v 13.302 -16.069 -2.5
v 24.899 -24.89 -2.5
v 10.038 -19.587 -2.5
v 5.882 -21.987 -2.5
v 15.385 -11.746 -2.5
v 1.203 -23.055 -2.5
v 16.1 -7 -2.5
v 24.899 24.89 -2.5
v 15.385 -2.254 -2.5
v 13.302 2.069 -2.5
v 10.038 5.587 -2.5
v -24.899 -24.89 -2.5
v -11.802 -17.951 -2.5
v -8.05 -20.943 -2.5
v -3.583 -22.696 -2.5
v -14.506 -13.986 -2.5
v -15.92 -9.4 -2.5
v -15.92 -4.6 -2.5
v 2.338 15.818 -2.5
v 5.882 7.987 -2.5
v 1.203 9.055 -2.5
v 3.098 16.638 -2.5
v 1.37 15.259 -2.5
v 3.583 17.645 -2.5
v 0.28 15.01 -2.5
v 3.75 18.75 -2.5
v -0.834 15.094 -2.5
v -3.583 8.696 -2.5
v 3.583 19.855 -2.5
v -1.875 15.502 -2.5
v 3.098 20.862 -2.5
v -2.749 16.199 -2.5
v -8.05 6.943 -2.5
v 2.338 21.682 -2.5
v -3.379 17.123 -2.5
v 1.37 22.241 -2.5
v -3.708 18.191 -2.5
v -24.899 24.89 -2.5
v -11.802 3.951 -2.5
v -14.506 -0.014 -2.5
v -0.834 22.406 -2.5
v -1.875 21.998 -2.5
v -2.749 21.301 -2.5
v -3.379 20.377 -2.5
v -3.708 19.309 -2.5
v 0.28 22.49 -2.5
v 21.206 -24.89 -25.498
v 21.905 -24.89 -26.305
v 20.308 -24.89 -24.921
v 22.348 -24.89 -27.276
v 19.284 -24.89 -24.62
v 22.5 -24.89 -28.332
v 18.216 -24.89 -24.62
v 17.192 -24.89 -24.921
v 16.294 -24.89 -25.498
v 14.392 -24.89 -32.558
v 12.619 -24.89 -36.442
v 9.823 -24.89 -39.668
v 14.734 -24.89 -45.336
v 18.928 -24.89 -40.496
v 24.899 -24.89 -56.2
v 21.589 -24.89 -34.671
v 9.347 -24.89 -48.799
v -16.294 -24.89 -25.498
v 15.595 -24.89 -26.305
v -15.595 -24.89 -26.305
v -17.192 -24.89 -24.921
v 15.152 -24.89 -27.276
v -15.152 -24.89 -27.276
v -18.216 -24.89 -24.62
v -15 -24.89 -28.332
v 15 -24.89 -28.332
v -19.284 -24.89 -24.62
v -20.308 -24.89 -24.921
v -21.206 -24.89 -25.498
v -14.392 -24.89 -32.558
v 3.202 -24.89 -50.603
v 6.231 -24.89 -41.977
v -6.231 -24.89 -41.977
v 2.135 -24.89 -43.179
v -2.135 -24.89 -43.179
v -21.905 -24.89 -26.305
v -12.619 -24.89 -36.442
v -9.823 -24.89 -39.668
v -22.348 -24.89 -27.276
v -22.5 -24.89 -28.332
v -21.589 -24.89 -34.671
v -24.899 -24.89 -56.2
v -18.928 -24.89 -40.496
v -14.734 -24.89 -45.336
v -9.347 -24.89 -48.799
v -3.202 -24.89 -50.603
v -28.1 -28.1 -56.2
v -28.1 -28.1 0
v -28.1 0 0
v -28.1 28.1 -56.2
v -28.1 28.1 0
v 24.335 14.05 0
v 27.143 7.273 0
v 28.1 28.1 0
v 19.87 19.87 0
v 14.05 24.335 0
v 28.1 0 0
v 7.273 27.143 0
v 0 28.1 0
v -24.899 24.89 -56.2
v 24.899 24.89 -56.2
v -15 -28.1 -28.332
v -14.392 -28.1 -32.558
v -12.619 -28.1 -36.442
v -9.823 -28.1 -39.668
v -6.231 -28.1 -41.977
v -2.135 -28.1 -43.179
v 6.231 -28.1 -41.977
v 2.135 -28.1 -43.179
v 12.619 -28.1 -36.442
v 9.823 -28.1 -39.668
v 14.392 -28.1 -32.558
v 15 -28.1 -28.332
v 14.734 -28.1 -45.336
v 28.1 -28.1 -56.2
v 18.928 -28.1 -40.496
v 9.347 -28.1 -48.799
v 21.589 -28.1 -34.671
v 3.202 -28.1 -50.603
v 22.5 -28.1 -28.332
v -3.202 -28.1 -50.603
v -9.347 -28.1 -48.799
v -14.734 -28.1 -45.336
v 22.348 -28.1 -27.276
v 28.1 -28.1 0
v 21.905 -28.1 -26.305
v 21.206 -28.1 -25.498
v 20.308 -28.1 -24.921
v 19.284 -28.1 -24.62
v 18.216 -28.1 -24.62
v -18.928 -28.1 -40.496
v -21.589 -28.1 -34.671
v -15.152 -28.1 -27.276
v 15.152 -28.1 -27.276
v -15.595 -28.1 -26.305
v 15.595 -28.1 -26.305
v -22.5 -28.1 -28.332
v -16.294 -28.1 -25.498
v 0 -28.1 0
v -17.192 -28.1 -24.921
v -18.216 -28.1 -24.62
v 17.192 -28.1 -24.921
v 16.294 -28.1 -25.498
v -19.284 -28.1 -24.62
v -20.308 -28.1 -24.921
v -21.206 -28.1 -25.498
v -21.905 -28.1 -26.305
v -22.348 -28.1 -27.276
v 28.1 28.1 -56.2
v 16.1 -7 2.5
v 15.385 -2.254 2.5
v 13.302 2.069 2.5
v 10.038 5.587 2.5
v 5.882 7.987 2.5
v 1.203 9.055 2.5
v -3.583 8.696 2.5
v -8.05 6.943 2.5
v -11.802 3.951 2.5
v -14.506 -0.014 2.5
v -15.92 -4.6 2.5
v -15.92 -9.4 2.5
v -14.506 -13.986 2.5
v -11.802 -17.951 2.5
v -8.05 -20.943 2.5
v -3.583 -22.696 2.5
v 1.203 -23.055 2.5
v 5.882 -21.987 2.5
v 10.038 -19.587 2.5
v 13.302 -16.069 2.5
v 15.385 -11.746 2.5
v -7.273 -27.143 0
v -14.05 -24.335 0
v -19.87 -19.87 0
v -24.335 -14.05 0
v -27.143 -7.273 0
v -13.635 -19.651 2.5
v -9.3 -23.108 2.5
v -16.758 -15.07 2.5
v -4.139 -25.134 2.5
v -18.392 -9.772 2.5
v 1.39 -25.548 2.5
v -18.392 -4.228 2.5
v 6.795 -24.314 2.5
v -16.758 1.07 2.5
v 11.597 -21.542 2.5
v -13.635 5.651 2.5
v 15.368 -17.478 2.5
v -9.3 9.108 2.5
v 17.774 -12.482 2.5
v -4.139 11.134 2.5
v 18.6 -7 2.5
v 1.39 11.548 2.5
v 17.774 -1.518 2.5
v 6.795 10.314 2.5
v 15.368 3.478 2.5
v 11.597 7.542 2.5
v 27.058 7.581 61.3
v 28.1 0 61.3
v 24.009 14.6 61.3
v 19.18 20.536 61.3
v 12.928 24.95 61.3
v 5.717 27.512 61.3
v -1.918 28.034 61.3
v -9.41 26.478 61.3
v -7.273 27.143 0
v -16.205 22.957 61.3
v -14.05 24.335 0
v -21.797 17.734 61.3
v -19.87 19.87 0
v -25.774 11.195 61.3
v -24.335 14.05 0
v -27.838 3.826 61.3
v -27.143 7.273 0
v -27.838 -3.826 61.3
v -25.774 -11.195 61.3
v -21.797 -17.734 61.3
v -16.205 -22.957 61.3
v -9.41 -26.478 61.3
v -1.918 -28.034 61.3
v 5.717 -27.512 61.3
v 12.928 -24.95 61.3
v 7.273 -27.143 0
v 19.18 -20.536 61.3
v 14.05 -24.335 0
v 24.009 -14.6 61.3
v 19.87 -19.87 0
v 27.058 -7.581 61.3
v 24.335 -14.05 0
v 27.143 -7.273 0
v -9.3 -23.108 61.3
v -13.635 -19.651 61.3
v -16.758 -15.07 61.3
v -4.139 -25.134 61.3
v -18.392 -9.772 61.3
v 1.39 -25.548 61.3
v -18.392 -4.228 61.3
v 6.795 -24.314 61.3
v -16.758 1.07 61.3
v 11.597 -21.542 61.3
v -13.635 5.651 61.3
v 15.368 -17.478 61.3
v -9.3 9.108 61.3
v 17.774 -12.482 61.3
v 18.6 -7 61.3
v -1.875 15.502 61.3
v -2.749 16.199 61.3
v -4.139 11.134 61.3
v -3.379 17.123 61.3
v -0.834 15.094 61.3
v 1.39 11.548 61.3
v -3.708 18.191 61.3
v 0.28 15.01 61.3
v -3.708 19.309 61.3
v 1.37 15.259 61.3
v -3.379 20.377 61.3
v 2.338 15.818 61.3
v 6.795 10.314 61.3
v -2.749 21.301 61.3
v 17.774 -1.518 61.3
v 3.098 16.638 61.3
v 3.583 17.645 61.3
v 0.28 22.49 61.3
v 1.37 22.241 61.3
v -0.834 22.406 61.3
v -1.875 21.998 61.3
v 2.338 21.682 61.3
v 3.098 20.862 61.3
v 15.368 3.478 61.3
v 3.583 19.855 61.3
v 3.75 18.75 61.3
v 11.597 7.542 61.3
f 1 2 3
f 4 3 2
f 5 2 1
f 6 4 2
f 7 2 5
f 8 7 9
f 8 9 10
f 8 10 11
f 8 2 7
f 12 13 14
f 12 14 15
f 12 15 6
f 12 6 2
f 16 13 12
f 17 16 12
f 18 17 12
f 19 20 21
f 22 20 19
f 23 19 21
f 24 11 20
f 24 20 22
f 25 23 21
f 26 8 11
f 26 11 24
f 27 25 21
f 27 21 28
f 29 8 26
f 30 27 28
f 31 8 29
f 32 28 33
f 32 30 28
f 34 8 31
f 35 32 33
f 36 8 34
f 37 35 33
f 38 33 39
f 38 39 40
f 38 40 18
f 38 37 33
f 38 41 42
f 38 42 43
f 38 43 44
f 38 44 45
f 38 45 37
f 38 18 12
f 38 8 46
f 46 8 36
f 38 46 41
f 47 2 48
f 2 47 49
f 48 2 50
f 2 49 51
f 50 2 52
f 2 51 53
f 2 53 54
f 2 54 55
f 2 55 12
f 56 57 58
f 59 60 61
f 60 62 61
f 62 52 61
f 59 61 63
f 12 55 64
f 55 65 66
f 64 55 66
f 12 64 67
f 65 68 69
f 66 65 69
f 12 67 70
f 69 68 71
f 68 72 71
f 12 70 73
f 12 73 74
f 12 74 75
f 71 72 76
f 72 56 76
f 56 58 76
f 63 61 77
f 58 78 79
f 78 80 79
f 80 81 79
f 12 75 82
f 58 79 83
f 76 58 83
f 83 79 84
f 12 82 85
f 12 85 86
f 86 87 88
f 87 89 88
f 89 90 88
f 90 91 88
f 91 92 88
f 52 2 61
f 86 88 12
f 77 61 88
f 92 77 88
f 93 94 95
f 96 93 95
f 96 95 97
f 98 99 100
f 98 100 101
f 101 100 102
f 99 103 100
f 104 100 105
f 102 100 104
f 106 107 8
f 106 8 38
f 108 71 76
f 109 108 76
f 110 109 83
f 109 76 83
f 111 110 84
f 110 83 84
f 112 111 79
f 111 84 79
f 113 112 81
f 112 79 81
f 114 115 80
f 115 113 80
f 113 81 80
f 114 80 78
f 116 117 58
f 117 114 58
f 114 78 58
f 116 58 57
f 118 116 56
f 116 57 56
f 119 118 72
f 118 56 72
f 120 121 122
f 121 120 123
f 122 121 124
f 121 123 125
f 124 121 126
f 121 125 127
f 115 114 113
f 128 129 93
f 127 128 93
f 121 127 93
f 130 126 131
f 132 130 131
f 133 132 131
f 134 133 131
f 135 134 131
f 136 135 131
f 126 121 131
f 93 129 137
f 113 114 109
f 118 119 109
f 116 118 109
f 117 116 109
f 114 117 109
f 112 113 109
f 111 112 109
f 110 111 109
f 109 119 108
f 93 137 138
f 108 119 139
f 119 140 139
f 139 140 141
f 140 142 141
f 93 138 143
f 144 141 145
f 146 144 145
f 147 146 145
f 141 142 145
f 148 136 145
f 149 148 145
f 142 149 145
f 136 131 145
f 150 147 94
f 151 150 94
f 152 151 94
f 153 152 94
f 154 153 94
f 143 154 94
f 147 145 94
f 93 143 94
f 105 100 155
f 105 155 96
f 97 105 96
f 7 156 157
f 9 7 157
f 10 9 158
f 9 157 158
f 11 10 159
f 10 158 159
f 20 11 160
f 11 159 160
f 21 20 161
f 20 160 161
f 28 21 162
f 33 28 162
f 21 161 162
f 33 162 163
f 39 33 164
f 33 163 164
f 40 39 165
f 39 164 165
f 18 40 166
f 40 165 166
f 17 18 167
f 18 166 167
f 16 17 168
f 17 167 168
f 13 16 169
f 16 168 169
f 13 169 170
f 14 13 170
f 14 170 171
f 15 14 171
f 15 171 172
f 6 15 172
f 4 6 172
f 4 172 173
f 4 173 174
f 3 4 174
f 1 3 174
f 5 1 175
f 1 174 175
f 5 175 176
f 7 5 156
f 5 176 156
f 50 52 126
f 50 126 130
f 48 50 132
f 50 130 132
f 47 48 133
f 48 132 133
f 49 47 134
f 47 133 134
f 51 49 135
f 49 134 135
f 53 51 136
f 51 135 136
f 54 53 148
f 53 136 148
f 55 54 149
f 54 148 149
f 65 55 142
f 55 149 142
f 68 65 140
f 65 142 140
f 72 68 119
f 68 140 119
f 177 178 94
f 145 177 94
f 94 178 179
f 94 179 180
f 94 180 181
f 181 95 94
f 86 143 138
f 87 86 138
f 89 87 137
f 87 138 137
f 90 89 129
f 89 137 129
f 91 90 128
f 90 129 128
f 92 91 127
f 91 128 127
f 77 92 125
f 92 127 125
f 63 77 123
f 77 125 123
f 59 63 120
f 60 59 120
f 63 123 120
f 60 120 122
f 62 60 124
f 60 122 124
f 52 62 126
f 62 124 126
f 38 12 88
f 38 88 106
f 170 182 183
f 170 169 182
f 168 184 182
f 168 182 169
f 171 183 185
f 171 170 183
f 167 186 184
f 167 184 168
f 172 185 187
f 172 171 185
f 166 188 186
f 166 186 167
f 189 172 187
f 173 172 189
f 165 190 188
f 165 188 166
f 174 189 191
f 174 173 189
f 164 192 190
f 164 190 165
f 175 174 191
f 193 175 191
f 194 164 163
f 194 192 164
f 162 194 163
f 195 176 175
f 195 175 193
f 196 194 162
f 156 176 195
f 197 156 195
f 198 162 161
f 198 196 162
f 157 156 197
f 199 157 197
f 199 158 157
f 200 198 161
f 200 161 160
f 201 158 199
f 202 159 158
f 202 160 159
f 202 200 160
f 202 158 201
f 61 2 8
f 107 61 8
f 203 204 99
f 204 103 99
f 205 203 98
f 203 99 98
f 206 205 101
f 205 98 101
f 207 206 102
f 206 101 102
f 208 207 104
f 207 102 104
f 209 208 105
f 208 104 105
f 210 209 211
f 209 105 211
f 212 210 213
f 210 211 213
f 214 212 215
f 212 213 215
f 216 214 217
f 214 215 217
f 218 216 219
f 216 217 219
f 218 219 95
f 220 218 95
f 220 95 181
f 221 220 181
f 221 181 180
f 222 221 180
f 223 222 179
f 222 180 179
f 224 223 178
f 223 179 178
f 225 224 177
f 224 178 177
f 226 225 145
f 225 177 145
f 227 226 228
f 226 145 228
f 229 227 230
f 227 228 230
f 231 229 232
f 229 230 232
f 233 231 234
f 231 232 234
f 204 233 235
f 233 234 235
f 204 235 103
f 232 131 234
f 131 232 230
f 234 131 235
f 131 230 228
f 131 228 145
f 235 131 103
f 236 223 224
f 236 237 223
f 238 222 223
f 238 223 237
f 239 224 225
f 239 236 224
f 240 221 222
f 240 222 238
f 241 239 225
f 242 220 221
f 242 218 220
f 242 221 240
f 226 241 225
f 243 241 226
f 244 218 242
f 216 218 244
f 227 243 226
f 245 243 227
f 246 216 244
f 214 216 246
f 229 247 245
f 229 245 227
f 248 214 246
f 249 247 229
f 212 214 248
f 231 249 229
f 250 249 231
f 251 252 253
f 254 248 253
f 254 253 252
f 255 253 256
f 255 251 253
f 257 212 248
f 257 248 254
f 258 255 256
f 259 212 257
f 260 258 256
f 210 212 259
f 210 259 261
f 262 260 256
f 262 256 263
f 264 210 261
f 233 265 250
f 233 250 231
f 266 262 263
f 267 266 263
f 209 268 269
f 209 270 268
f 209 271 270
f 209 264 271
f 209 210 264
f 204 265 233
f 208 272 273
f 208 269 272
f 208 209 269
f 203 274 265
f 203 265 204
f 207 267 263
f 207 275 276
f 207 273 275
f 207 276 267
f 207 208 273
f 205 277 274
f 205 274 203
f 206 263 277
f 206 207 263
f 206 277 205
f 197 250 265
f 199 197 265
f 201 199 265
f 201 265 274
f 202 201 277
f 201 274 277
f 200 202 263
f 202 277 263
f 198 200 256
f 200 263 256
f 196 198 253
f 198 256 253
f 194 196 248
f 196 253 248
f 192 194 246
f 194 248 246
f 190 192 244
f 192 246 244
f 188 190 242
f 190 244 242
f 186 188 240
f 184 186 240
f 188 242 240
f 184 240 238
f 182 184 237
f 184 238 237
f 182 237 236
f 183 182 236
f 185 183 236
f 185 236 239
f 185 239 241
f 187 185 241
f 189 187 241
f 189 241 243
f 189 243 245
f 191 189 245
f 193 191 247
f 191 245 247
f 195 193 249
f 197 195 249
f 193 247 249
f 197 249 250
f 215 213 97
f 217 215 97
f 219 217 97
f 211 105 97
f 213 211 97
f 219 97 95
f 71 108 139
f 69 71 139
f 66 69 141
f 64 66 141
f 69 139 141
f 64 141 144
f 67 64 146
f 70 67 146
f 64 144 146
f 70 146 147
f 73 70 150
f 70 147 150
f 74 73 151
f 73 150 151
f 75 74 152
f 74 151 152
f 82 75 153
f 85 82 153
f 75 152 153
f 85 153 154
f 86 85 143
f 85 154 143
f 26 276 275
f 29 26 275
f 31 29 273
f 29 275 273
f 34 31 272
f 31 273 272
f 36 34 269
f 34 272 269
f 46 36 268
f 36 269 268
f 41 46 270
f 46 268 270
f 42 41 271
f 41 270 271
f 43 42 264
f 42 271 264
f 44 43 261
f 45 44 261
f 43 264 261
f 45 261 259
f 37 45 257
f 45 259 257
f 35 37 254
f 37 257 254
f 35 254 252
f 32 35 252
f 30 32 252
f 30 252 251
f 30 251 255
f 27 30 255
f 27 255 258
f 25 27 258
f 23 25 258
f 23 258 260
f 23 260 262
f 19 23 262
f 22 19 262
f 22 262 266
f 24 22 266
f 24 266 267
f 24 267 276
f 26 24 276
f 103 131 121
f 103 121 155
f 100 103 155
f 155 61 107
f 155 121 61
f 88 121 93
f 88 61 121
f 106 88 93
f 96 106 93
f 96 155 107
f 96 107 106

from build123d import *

# Parameters (mm, degrees)
SKETCH1_R           = 28.1
BOSS_EXTRUDE2_DEPTH = 61.3
SKETCH3_R           = 18.6
CUT_EXTRUDE2_DEPTH  = 58.8
SKETCH4_W           = 56.2
SKETCH4_H           = 56.2
BOSS_EXTRUDE3_DEPTH = 56.2
SKETCH5_R           = 16.1
CUT_EXTRUDE4_DEPTH  = 5
SKETCH6_W           = 49.797391422
SKETCH6_H           = 49.779255452
CUT_EXTRUDE5_DEPTH  = 53.7
SKETCH7_R           = 28.1
BOSS_EXTRUDE4_DEPTH = 321.5
CUT_EXTRUDE6_DEPTH  = 10
SKETCH9_R           = 3
CUT_EXTRUDE7_DEPTH  = 1
SKETCH10_R          = 6.025
CUT_EXTRUDE8_DEPTH  = 0.1
SKETCH18_R          = 3.75
CUT_EXTRUDE9_DEPTH  = 100
SKETCH19_R          = 3.75
CUT_EXTRUDE11_DEPTH = 325
SKETCH20_W          = 86.001348001
SKETCH20_H          = 379.283348588
CUT_EXTRUDE16_DEPTH = 171.5


with BuildPart() as part:
    # Sketch1 → Boss-Extrude2 (new body)
    with BuildSketch(Plane.XY):
        Circle(SKETCH1_R)
    extrude(amount=BOSS_EXTRUDE2_DEPTH)

    # Sketch3 → Cut-Extrude2 (cut)
    with BuildSketch(Plane.XY.offset(61.3)):
        with Locations((0, -7)):
            Circle(SKETCH3_R)
    extrude(amount=-CUT_EXTRUDE2_DEPTH, mode=Mode.SUBTRACT)

    # Sketch4 → Boss-Extrude3 (add)
    with BuildSketch(Plane(origin=(0, 0, 0), x_dir=(-1, 0, 0), z_dir=(0, 0, -1))):
        Rectangle(SKETCH4_W, SKETCH4_H)
    extrude(amount=BOSS_EXTRUDE3_DEPTH)

    # Sketch5 → Cut-Extrude4 (cut)
    with BuildSketch(Plane.XY.offset(2.5)):
        with Locations((0, -7)):
            Circle(SKETCH5_R)
    extrude(amount=-CUT_EXTRUDE4_DEPTH, mode=Mode.SUBTRACT)

    # Sketch6 → Cut-Extrude5 (cut)
    with BuildSketch(Plane(origin=(0, 0, -56.2), x_dir=(-1, 0, 0), z_dir=(0, 0, -1))):
        Rectangle(SKETCH6_W, SKETCH6_H)
    extrude(amount=-CUT_EXTRUDE5_DEPTH, mode=Mode.SUBTRACT)

    # Sketch7 → Boss-Extrude4 (add)
    with BuildSketch(Plane(origin=(0, -28.1, 0), x_dir=(-1, 0, 0), z_dir=(0, -1, 0))):
        with Locations(Location((0, 28.1, 0), (0, 0, 90))):
            Circle(SKETCH7_R)
    extrude(amount=BOSS_EXTRUDE4_DEPTH)

    # Sketch8 → Cut-Extrude6 (cut)
    with BuildSketch(Plane(origin=(0, -349.6, 0), x_dir=(-1, 0, 0), z_dir=(0, -1, 0))):
        with BuildLine():
            Line((-1.658312395, 25.832078896), (1.658312395, 25.832078896))
            ThreePointArc((1.658312395, 25.832078896), (3, 28.332078896), (1.658312395, 30.832078896))
            Line((1.658312395, 30.832078896), (-1.658312395, 30.832078896))
            ThreePointArc((-1.658312395, 30.832078896), (-3, 28.332078896), (-1.658312395, 25.832078896))
        make_face()
    extrude(amount=-CUT_EXTRUDE6_DEPTH, mode=Mode.SUBTRACT)

    # Sketch9 → Cut-Extrude7 (cut)
    with BuildSketch(Plane(origin=(0, -349.6, 0), x_dir=(-1, 0, 0), z_dir=(0, -1, 0))):
        with Locations(Location((0, 28.332078896, 0), (0, 0, 90))):
            Circle(SKETCH9_R)
    extrude(amount=-CUT_EXTRUDE7_DEPTH, mode=Mode.SUBTRACT)

    # Sketch10 → Cut-Extrude8 (cut)
    with BuildSketch(Plane(origin=(0, -349.6, 0), x_dir=(-1, 0, 0), z_dir=(0, -1, 0))):
        with Locations(Location((0, 28.332078896, 0), (0, 0, 90))):
            Circle(SKETCH10_R)
    extrude(amount=-CUT_EXTRUDE8_DEPTH, mode=Mode.SUBTRACT)

    # Cut-Sweep4: sweep along a path in Sketch15
    with BuildLine(Plane(origin=(0, -349.6, 0), x_dir=(-1, 0, 0), z_dir=(0, -1, 0))) as cut_sweep4_path:
        ThreePointArc((15, 28.332078896), (0, 43.332078896), (-15, 28.332078896))
    # 3DSketch2 → Cut-Sweep4 (sweep, cut)
    with BuildSketch(Plane(origin=(-15, -349.6, -28.332078896), x_dir=(-0.022748965612757834, 0.999741208795331, 0), z_dir=(0, 0, 1))):
        Polygon((0, 0), (0.170617242, 7.498059066), (329.685319661, 0), (329.514702419, -7.498059066), align=None)
    sweep(path=cut_sweep4_path.line, mode=Mode.SUBTRACT)

    # Sketch18 → Cut-Extrude9 (cut)
    with BuildSketch(Plane.XY.offset(61.3)):
        with Locations((0, 18.75)):
            Circle(SKETCH18_R)
    extrude(amount=-CUT_EXTRUDE9_DEPTH, mode=Mode.SUBTRACT)

    # Sketch19 → Cut-Extrude11 (cut)
    with BuildSketch(Plane(origin=(0, -349.6, 0), x_dir=(-1, 0, 0), z_dir=(0, -1, 0))):
        with Locations((-18.75, 28.332078896)):
            Circle(SKETCH19_R)
        with Locations((18.75, 28.332078896)):
            Circle(SKETCH19_R)
    extrude(amount=-CUT_EXTRUDE11_DEPTH, mode=Mode.SUBTRACT)

    # Sketch20 → Cut-Extrude16 (cut)
    with BuildSketch(Plane(origin=(0, 0, -56.2), x_dir=(-1, 0, 0), z_dir=(0, 0, -1))):
        with Locations((14.900674001, -217.741674294)):
            Rectangle(SKETCH20_W, SKETCH20_H)
    extrude(amount=-CUT_EXTRUDE16_DEPTH, mode=Mode.SUBTRACT)


solid = part.part
